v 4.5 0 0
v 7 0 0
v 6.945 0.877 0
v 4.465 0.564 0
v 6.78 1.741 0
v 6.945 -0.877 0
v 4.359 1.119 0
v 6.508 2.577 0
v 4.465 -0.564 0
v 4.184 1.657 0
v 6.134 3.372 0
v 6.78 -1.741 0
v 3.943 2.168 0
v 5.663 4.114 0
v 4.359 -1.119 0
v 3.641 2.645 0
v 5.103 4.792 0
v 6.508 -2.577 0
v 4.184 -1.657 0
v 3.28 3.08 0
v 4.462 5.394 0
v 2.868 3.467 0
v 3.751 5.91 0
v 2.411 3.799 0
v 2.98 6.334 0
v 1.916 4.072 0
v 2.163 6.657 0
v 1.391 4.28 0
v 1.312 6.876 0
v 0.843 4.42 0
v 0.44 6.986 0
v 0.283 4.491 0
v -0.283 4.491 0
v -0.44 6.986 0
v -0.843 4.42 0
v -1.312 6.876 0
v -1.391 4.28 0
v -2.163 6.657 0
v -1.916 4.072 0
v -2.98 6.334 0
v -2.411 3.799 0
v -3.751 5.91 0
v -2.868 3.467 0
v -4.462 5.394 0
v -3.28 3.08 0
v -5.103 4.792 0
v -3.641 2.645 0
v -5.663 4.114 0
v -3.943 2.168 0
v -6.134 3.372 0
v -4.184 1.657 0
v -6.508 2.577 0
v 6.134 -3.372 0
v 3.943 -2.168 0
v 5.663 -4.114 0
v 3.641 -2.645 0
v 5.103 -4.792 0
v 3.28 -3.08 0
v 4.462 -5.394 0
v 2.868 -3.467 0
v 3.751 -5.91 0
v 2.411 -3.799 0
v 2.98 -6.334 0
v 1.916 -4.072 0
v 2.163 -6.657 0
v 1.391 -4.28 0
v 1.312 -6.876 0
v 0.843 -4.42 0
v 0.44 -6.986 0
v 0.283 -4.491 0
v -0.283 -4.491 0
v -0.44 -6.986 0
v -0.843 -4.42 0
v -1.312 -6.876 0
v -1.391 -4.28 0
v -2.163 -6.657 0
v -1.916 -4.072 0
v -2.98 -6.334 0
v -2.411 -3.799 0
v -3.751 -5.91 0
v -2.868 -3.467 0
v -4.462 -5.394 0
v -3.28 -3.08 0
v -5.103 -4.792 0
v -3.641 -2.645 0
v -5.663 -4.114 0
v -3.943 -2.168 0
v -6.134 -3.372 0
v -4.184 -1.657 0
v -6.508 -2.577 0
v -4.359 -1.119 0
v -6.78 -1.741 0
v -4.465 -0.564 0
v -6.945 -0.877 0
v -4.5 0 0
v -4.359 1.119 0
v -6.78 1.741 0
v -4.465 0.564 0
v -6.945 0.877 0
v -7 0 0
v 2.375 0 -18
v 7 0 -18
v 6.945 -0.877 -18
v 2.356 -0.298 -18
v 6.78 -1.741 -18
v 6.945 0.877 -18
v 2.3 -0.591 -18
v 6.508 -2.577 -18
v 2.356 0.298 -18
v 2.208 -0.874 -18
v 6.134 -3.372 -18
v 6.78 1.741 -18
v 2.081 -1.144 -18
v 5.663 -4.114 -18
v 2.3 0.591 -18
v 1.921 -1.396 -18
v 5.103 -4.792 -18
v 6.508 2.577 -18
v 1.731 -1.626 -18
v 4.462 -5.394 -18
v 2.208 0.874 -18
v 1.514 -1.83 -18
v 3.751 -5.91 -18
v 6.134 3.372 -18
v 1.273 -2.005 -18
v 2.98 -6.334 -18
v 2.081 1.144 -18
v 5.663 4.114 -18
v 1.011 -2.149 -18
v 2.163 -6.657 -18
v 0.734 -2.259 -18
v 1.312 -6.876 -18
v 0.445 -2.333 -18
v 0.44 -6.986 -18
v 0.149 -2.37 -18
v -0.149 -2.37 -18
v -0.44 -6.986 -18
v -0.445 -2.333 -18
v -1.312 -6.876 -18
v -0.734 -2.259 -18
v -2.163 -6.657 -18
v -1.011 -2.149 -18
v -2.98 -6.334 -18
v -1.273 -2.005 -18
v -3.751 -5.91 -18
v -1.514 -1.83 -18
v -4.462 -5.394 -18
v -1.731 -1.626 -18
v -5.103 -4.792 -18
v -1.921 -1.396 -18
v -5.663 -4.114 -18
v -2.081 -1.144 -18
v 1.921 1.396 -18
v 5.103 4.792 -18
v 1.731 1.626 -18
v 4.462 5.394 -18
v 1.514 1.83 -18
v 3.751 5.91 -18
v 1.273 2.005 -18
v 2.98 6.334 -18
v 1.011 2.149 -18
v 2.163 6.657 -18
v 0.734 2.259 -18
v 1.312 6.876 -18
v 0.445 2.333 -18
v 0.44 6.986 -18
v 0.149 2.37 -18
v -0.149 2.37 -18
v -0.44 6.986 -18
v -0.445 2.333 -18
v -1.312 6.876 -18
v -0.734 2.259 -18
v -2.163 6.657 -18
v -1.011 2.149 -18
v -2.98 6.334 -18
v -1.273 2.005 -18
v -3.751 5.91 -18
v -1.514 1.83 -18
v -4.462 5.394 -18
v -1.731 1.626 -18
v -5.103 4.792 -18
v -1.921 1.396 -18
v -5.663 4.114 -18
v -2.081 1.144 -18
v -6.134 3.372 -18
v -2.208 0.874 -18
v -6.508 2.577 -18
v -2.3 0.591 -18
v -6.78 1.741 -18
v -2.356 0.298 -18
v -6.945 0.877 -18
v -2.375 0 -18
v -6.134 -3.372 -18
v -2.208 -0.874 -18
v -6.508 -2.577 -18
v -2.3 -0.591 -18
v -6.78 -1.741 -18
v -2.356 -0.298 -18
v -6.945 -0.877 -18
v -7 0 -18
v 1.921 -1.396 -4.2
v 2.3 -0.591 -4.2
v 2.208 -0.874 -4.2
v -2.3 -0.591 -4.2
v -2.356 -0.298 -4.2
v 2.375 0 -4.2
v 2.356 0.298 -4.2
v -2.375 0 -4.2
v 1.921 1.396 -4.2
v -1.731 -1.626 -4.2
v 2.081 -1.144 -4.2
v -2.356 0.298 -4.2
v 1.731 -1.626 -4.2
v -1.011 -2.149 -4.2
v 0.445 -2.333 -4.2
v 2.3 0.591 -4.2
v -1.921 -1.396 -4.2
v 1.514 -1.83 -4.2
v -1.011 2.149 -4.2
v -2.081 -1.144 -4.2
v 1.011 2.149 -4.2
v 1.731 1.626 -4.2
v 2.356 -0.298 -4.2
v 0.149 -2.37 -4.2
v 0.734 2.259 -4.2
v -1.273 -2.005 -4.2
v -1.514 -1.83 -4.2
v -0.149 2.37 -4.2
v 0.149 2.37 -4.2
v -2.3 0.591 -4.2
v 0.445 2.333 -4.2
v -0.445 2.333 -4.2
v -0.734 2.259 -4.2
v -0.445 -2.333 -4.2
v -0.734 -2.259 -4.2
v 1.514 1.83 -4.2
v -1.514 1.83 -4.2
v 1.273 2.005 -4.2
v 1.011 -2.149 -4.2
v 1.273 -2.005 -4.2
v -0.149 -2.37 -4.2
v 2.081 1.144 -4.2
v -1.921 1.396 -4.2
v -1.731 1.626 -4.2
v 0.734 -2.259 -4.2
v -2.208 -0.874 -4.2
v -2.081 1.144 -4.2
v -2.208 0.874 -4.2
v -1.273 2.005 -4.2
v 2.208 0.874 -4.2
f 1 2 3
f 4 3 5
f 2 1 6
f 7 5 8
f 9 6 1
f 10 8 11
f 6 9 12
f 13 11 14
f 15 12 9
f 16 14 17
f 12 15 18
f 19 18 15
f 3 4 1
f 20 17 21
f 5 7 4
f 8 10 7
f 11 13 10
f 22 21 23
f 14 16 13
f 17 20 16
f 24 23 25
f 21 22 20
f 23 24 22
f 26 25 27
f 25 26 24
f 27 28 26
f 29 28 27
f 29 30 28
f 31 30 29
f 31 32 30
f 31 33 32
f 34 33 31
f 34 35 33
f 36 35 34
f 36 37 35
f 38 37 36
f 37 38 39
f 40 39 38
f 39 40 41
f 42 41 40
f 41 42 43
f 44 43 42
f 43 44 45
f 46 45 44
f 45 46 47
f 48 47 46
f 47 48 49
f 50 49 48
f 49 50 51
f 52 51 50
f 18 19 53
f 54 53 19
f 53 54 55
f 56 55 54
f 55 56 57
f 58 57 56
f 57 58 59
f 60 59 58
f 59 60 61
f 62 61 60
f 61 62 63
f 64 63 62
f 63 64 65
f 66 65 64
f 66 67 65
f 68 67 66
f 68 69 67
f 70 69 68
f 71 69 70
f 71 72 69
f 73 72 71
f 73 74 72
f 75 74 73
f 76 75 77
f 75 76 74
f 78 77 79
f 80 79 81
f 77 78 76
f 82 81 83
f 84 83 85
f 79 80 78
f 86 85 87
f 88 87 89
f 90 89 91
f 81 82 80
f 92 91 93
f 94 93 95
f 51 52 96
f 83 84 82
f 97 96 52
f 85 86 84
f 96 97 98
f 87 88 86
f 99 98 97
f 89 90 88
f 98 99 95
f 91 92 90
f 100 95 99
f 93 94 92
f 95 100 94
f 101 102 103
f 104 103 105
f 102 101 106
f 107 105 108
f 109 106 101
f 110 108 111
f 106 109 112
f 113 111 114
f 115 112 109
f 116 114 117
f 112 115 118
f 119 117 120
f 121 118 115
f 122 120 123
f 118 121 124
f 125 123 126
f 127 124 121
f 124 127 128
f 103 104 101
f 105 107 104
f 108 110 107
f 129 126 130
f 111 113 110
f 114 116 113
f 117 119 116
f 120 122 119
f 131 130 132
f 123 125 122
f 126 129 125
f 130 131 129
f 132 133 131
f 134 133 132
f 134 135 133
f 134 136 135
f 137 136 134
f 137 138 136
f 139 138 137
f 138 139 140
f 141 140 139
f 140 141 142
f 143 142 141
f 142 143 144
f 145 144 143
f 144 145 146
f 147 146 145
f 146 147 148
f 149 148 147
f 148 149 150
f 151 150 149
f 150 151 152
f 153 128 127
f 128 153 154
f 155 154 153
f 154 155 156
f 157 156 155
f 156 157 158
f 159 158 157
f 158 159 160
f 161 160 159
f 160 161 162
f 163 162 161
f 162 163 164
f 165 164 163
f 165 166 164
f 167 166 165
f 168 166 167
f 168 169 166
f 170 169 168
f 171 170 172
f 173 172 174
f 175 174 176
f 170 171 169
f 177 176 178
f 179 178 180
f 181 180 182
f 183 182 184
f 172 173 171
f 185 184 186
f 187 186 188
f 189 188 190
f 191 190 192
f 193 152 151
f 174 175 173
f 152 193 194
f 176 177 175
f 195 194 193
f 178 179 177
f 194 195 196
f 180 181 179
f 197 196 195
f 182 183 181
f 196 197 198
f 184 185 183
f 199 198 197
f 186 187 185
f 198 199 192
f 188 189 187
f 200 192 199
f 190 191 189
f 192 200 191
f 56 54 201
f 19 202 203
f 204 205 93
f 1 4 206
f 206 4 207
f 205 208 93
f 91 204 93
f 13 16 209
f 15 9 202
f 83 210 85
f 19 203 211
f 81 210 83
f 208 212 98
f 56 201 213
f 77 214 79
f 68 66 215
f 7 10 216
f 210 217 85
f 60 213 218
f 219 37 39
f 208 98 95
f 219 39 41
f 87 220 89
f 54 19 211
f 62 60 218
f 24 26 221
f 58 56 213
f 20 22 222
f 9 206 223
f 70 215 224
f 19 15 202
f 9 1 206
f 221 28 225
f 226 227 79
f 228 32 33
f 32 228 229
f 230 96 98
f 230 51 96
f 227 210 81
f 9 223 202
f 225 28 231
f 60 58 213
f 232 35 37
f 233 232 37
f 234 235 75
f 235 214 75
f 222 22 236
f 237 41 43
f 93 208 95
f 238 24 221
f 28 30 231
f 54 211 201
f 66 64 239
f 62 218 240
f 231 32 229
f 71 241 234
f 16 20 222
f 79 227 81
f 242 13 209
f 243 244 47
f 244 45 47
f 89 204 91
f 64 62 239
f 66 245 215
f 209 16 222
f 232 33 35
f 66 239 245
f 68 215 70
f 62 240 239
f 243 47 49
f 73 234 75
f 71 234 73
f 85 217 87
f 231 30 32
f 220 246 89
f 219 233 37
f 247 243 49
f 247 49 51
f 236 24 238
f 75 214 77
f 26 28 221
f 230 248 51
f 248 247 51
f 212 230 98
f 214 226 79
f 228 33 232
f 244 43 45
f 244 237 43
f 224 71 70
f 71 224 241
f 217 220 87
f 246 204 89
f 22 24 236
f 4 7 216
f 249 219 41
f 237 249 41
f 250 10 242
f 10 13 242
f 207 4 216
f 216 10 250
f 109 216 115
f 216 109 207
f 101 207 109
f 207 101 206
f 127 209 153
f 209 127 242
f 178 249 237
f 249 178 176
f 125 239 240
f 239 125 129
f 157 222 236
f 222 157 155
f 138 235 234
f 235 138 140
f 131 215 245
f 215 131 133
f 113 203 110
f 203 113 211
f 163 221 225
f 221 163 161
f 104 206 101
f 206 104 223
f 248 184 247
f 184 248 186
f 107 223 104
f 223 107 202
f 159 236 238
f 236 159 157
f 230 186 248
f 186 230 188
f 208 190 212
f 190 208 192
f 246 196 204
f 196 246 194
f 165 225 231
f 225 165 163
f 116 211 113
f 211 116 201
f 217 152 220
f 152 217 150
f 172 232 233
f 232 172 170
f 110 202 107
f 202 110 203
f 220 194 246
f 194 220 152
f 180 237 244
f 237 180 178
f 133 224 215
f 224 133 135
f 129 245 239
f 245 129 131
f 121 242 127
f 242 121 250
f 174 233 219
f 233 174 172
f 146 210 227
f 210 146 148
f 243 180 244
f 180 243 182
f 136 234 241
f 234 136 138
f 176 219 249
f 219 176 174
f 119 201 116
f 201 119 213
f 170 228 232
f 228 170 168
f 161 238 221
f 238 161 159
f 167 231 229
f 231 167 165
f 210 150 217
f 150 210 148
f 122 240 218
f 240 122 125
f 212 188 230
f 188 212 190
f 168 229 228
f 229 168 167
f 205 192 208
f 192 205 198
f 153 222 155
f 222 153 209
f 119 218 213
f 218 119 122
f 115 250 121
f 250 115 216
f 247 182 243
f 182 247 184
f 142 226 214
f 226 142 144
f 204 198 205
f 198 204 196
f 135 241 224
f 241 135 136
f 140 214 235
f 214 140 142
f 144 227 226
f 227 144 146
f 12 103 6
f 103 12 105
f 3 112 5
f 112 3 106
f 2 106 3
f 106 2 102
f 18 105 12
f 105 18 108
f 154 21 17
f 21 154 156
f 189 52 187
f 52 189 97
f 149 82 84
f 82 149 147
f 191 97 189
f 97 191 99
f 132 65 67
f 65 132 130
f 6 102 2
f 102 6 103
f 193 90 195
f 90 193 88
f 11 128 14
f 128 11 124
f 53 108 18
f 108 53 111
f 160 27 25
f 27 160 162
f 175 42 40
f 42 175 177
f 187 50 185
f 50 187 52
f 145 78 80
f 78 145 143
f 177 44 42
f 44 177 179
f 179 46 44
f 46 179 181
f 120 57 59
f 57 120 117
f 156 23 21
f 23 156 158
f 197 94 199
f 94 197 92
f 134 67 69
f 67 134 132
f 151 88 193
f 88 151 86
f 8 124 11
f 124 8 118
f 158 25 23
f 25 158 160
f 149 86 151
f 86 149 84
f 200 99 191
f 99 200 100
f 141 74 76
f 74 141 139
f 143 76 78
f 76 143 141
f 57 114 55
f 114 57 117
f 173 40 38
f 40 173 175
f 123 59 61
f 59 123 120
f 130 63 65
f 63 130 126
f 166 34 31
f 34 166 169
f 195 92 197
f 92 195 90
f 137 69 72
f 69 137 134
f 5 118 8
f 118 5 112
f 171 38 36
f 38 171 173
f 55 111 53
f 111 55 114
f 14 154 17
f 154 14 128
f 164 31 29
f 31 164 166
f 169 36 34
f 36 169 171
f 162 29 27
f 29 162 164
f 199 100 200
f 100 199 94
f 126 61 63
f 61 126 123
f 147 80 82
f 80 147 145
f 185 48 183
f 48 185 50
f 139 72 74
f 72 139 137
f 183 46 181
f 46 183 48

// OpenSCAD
$fn = 50;


difference() {
	union() {
		translate(v = [0, 0, -18.0000000000]) {
			cylinder(h = 18, r = 7.0000000000);
		}
		cylinder(h = 0, r = 17.0000000000);
	}
	union() {
		translate(v = [0, 0, 0]) {
			rotate(a = [0, 0, 0]) {
				difference() {
					union() {
						#translate(v = [0, 0, -18.0000000000]) {
							cylinder(h = 18, r = 2.2500000000);
						}
						#translate(v = [0, 0, -4.2000000000]) {
							cylinder(h = 4.2000000000, r1 = 2.3750000000, r2 = 4.5000000000);
						}
						#translate(v = [0, 0, -18.0000000000]) {
							cylinder(h = 18, r = 2.3750000000);
						}
						#translate(v = [0, 0, -18.0000000000]) {
							cylinder(h = 18, r = 2.2500000000);
						}
					}
					union();
				}
			}
		}
	}
}
